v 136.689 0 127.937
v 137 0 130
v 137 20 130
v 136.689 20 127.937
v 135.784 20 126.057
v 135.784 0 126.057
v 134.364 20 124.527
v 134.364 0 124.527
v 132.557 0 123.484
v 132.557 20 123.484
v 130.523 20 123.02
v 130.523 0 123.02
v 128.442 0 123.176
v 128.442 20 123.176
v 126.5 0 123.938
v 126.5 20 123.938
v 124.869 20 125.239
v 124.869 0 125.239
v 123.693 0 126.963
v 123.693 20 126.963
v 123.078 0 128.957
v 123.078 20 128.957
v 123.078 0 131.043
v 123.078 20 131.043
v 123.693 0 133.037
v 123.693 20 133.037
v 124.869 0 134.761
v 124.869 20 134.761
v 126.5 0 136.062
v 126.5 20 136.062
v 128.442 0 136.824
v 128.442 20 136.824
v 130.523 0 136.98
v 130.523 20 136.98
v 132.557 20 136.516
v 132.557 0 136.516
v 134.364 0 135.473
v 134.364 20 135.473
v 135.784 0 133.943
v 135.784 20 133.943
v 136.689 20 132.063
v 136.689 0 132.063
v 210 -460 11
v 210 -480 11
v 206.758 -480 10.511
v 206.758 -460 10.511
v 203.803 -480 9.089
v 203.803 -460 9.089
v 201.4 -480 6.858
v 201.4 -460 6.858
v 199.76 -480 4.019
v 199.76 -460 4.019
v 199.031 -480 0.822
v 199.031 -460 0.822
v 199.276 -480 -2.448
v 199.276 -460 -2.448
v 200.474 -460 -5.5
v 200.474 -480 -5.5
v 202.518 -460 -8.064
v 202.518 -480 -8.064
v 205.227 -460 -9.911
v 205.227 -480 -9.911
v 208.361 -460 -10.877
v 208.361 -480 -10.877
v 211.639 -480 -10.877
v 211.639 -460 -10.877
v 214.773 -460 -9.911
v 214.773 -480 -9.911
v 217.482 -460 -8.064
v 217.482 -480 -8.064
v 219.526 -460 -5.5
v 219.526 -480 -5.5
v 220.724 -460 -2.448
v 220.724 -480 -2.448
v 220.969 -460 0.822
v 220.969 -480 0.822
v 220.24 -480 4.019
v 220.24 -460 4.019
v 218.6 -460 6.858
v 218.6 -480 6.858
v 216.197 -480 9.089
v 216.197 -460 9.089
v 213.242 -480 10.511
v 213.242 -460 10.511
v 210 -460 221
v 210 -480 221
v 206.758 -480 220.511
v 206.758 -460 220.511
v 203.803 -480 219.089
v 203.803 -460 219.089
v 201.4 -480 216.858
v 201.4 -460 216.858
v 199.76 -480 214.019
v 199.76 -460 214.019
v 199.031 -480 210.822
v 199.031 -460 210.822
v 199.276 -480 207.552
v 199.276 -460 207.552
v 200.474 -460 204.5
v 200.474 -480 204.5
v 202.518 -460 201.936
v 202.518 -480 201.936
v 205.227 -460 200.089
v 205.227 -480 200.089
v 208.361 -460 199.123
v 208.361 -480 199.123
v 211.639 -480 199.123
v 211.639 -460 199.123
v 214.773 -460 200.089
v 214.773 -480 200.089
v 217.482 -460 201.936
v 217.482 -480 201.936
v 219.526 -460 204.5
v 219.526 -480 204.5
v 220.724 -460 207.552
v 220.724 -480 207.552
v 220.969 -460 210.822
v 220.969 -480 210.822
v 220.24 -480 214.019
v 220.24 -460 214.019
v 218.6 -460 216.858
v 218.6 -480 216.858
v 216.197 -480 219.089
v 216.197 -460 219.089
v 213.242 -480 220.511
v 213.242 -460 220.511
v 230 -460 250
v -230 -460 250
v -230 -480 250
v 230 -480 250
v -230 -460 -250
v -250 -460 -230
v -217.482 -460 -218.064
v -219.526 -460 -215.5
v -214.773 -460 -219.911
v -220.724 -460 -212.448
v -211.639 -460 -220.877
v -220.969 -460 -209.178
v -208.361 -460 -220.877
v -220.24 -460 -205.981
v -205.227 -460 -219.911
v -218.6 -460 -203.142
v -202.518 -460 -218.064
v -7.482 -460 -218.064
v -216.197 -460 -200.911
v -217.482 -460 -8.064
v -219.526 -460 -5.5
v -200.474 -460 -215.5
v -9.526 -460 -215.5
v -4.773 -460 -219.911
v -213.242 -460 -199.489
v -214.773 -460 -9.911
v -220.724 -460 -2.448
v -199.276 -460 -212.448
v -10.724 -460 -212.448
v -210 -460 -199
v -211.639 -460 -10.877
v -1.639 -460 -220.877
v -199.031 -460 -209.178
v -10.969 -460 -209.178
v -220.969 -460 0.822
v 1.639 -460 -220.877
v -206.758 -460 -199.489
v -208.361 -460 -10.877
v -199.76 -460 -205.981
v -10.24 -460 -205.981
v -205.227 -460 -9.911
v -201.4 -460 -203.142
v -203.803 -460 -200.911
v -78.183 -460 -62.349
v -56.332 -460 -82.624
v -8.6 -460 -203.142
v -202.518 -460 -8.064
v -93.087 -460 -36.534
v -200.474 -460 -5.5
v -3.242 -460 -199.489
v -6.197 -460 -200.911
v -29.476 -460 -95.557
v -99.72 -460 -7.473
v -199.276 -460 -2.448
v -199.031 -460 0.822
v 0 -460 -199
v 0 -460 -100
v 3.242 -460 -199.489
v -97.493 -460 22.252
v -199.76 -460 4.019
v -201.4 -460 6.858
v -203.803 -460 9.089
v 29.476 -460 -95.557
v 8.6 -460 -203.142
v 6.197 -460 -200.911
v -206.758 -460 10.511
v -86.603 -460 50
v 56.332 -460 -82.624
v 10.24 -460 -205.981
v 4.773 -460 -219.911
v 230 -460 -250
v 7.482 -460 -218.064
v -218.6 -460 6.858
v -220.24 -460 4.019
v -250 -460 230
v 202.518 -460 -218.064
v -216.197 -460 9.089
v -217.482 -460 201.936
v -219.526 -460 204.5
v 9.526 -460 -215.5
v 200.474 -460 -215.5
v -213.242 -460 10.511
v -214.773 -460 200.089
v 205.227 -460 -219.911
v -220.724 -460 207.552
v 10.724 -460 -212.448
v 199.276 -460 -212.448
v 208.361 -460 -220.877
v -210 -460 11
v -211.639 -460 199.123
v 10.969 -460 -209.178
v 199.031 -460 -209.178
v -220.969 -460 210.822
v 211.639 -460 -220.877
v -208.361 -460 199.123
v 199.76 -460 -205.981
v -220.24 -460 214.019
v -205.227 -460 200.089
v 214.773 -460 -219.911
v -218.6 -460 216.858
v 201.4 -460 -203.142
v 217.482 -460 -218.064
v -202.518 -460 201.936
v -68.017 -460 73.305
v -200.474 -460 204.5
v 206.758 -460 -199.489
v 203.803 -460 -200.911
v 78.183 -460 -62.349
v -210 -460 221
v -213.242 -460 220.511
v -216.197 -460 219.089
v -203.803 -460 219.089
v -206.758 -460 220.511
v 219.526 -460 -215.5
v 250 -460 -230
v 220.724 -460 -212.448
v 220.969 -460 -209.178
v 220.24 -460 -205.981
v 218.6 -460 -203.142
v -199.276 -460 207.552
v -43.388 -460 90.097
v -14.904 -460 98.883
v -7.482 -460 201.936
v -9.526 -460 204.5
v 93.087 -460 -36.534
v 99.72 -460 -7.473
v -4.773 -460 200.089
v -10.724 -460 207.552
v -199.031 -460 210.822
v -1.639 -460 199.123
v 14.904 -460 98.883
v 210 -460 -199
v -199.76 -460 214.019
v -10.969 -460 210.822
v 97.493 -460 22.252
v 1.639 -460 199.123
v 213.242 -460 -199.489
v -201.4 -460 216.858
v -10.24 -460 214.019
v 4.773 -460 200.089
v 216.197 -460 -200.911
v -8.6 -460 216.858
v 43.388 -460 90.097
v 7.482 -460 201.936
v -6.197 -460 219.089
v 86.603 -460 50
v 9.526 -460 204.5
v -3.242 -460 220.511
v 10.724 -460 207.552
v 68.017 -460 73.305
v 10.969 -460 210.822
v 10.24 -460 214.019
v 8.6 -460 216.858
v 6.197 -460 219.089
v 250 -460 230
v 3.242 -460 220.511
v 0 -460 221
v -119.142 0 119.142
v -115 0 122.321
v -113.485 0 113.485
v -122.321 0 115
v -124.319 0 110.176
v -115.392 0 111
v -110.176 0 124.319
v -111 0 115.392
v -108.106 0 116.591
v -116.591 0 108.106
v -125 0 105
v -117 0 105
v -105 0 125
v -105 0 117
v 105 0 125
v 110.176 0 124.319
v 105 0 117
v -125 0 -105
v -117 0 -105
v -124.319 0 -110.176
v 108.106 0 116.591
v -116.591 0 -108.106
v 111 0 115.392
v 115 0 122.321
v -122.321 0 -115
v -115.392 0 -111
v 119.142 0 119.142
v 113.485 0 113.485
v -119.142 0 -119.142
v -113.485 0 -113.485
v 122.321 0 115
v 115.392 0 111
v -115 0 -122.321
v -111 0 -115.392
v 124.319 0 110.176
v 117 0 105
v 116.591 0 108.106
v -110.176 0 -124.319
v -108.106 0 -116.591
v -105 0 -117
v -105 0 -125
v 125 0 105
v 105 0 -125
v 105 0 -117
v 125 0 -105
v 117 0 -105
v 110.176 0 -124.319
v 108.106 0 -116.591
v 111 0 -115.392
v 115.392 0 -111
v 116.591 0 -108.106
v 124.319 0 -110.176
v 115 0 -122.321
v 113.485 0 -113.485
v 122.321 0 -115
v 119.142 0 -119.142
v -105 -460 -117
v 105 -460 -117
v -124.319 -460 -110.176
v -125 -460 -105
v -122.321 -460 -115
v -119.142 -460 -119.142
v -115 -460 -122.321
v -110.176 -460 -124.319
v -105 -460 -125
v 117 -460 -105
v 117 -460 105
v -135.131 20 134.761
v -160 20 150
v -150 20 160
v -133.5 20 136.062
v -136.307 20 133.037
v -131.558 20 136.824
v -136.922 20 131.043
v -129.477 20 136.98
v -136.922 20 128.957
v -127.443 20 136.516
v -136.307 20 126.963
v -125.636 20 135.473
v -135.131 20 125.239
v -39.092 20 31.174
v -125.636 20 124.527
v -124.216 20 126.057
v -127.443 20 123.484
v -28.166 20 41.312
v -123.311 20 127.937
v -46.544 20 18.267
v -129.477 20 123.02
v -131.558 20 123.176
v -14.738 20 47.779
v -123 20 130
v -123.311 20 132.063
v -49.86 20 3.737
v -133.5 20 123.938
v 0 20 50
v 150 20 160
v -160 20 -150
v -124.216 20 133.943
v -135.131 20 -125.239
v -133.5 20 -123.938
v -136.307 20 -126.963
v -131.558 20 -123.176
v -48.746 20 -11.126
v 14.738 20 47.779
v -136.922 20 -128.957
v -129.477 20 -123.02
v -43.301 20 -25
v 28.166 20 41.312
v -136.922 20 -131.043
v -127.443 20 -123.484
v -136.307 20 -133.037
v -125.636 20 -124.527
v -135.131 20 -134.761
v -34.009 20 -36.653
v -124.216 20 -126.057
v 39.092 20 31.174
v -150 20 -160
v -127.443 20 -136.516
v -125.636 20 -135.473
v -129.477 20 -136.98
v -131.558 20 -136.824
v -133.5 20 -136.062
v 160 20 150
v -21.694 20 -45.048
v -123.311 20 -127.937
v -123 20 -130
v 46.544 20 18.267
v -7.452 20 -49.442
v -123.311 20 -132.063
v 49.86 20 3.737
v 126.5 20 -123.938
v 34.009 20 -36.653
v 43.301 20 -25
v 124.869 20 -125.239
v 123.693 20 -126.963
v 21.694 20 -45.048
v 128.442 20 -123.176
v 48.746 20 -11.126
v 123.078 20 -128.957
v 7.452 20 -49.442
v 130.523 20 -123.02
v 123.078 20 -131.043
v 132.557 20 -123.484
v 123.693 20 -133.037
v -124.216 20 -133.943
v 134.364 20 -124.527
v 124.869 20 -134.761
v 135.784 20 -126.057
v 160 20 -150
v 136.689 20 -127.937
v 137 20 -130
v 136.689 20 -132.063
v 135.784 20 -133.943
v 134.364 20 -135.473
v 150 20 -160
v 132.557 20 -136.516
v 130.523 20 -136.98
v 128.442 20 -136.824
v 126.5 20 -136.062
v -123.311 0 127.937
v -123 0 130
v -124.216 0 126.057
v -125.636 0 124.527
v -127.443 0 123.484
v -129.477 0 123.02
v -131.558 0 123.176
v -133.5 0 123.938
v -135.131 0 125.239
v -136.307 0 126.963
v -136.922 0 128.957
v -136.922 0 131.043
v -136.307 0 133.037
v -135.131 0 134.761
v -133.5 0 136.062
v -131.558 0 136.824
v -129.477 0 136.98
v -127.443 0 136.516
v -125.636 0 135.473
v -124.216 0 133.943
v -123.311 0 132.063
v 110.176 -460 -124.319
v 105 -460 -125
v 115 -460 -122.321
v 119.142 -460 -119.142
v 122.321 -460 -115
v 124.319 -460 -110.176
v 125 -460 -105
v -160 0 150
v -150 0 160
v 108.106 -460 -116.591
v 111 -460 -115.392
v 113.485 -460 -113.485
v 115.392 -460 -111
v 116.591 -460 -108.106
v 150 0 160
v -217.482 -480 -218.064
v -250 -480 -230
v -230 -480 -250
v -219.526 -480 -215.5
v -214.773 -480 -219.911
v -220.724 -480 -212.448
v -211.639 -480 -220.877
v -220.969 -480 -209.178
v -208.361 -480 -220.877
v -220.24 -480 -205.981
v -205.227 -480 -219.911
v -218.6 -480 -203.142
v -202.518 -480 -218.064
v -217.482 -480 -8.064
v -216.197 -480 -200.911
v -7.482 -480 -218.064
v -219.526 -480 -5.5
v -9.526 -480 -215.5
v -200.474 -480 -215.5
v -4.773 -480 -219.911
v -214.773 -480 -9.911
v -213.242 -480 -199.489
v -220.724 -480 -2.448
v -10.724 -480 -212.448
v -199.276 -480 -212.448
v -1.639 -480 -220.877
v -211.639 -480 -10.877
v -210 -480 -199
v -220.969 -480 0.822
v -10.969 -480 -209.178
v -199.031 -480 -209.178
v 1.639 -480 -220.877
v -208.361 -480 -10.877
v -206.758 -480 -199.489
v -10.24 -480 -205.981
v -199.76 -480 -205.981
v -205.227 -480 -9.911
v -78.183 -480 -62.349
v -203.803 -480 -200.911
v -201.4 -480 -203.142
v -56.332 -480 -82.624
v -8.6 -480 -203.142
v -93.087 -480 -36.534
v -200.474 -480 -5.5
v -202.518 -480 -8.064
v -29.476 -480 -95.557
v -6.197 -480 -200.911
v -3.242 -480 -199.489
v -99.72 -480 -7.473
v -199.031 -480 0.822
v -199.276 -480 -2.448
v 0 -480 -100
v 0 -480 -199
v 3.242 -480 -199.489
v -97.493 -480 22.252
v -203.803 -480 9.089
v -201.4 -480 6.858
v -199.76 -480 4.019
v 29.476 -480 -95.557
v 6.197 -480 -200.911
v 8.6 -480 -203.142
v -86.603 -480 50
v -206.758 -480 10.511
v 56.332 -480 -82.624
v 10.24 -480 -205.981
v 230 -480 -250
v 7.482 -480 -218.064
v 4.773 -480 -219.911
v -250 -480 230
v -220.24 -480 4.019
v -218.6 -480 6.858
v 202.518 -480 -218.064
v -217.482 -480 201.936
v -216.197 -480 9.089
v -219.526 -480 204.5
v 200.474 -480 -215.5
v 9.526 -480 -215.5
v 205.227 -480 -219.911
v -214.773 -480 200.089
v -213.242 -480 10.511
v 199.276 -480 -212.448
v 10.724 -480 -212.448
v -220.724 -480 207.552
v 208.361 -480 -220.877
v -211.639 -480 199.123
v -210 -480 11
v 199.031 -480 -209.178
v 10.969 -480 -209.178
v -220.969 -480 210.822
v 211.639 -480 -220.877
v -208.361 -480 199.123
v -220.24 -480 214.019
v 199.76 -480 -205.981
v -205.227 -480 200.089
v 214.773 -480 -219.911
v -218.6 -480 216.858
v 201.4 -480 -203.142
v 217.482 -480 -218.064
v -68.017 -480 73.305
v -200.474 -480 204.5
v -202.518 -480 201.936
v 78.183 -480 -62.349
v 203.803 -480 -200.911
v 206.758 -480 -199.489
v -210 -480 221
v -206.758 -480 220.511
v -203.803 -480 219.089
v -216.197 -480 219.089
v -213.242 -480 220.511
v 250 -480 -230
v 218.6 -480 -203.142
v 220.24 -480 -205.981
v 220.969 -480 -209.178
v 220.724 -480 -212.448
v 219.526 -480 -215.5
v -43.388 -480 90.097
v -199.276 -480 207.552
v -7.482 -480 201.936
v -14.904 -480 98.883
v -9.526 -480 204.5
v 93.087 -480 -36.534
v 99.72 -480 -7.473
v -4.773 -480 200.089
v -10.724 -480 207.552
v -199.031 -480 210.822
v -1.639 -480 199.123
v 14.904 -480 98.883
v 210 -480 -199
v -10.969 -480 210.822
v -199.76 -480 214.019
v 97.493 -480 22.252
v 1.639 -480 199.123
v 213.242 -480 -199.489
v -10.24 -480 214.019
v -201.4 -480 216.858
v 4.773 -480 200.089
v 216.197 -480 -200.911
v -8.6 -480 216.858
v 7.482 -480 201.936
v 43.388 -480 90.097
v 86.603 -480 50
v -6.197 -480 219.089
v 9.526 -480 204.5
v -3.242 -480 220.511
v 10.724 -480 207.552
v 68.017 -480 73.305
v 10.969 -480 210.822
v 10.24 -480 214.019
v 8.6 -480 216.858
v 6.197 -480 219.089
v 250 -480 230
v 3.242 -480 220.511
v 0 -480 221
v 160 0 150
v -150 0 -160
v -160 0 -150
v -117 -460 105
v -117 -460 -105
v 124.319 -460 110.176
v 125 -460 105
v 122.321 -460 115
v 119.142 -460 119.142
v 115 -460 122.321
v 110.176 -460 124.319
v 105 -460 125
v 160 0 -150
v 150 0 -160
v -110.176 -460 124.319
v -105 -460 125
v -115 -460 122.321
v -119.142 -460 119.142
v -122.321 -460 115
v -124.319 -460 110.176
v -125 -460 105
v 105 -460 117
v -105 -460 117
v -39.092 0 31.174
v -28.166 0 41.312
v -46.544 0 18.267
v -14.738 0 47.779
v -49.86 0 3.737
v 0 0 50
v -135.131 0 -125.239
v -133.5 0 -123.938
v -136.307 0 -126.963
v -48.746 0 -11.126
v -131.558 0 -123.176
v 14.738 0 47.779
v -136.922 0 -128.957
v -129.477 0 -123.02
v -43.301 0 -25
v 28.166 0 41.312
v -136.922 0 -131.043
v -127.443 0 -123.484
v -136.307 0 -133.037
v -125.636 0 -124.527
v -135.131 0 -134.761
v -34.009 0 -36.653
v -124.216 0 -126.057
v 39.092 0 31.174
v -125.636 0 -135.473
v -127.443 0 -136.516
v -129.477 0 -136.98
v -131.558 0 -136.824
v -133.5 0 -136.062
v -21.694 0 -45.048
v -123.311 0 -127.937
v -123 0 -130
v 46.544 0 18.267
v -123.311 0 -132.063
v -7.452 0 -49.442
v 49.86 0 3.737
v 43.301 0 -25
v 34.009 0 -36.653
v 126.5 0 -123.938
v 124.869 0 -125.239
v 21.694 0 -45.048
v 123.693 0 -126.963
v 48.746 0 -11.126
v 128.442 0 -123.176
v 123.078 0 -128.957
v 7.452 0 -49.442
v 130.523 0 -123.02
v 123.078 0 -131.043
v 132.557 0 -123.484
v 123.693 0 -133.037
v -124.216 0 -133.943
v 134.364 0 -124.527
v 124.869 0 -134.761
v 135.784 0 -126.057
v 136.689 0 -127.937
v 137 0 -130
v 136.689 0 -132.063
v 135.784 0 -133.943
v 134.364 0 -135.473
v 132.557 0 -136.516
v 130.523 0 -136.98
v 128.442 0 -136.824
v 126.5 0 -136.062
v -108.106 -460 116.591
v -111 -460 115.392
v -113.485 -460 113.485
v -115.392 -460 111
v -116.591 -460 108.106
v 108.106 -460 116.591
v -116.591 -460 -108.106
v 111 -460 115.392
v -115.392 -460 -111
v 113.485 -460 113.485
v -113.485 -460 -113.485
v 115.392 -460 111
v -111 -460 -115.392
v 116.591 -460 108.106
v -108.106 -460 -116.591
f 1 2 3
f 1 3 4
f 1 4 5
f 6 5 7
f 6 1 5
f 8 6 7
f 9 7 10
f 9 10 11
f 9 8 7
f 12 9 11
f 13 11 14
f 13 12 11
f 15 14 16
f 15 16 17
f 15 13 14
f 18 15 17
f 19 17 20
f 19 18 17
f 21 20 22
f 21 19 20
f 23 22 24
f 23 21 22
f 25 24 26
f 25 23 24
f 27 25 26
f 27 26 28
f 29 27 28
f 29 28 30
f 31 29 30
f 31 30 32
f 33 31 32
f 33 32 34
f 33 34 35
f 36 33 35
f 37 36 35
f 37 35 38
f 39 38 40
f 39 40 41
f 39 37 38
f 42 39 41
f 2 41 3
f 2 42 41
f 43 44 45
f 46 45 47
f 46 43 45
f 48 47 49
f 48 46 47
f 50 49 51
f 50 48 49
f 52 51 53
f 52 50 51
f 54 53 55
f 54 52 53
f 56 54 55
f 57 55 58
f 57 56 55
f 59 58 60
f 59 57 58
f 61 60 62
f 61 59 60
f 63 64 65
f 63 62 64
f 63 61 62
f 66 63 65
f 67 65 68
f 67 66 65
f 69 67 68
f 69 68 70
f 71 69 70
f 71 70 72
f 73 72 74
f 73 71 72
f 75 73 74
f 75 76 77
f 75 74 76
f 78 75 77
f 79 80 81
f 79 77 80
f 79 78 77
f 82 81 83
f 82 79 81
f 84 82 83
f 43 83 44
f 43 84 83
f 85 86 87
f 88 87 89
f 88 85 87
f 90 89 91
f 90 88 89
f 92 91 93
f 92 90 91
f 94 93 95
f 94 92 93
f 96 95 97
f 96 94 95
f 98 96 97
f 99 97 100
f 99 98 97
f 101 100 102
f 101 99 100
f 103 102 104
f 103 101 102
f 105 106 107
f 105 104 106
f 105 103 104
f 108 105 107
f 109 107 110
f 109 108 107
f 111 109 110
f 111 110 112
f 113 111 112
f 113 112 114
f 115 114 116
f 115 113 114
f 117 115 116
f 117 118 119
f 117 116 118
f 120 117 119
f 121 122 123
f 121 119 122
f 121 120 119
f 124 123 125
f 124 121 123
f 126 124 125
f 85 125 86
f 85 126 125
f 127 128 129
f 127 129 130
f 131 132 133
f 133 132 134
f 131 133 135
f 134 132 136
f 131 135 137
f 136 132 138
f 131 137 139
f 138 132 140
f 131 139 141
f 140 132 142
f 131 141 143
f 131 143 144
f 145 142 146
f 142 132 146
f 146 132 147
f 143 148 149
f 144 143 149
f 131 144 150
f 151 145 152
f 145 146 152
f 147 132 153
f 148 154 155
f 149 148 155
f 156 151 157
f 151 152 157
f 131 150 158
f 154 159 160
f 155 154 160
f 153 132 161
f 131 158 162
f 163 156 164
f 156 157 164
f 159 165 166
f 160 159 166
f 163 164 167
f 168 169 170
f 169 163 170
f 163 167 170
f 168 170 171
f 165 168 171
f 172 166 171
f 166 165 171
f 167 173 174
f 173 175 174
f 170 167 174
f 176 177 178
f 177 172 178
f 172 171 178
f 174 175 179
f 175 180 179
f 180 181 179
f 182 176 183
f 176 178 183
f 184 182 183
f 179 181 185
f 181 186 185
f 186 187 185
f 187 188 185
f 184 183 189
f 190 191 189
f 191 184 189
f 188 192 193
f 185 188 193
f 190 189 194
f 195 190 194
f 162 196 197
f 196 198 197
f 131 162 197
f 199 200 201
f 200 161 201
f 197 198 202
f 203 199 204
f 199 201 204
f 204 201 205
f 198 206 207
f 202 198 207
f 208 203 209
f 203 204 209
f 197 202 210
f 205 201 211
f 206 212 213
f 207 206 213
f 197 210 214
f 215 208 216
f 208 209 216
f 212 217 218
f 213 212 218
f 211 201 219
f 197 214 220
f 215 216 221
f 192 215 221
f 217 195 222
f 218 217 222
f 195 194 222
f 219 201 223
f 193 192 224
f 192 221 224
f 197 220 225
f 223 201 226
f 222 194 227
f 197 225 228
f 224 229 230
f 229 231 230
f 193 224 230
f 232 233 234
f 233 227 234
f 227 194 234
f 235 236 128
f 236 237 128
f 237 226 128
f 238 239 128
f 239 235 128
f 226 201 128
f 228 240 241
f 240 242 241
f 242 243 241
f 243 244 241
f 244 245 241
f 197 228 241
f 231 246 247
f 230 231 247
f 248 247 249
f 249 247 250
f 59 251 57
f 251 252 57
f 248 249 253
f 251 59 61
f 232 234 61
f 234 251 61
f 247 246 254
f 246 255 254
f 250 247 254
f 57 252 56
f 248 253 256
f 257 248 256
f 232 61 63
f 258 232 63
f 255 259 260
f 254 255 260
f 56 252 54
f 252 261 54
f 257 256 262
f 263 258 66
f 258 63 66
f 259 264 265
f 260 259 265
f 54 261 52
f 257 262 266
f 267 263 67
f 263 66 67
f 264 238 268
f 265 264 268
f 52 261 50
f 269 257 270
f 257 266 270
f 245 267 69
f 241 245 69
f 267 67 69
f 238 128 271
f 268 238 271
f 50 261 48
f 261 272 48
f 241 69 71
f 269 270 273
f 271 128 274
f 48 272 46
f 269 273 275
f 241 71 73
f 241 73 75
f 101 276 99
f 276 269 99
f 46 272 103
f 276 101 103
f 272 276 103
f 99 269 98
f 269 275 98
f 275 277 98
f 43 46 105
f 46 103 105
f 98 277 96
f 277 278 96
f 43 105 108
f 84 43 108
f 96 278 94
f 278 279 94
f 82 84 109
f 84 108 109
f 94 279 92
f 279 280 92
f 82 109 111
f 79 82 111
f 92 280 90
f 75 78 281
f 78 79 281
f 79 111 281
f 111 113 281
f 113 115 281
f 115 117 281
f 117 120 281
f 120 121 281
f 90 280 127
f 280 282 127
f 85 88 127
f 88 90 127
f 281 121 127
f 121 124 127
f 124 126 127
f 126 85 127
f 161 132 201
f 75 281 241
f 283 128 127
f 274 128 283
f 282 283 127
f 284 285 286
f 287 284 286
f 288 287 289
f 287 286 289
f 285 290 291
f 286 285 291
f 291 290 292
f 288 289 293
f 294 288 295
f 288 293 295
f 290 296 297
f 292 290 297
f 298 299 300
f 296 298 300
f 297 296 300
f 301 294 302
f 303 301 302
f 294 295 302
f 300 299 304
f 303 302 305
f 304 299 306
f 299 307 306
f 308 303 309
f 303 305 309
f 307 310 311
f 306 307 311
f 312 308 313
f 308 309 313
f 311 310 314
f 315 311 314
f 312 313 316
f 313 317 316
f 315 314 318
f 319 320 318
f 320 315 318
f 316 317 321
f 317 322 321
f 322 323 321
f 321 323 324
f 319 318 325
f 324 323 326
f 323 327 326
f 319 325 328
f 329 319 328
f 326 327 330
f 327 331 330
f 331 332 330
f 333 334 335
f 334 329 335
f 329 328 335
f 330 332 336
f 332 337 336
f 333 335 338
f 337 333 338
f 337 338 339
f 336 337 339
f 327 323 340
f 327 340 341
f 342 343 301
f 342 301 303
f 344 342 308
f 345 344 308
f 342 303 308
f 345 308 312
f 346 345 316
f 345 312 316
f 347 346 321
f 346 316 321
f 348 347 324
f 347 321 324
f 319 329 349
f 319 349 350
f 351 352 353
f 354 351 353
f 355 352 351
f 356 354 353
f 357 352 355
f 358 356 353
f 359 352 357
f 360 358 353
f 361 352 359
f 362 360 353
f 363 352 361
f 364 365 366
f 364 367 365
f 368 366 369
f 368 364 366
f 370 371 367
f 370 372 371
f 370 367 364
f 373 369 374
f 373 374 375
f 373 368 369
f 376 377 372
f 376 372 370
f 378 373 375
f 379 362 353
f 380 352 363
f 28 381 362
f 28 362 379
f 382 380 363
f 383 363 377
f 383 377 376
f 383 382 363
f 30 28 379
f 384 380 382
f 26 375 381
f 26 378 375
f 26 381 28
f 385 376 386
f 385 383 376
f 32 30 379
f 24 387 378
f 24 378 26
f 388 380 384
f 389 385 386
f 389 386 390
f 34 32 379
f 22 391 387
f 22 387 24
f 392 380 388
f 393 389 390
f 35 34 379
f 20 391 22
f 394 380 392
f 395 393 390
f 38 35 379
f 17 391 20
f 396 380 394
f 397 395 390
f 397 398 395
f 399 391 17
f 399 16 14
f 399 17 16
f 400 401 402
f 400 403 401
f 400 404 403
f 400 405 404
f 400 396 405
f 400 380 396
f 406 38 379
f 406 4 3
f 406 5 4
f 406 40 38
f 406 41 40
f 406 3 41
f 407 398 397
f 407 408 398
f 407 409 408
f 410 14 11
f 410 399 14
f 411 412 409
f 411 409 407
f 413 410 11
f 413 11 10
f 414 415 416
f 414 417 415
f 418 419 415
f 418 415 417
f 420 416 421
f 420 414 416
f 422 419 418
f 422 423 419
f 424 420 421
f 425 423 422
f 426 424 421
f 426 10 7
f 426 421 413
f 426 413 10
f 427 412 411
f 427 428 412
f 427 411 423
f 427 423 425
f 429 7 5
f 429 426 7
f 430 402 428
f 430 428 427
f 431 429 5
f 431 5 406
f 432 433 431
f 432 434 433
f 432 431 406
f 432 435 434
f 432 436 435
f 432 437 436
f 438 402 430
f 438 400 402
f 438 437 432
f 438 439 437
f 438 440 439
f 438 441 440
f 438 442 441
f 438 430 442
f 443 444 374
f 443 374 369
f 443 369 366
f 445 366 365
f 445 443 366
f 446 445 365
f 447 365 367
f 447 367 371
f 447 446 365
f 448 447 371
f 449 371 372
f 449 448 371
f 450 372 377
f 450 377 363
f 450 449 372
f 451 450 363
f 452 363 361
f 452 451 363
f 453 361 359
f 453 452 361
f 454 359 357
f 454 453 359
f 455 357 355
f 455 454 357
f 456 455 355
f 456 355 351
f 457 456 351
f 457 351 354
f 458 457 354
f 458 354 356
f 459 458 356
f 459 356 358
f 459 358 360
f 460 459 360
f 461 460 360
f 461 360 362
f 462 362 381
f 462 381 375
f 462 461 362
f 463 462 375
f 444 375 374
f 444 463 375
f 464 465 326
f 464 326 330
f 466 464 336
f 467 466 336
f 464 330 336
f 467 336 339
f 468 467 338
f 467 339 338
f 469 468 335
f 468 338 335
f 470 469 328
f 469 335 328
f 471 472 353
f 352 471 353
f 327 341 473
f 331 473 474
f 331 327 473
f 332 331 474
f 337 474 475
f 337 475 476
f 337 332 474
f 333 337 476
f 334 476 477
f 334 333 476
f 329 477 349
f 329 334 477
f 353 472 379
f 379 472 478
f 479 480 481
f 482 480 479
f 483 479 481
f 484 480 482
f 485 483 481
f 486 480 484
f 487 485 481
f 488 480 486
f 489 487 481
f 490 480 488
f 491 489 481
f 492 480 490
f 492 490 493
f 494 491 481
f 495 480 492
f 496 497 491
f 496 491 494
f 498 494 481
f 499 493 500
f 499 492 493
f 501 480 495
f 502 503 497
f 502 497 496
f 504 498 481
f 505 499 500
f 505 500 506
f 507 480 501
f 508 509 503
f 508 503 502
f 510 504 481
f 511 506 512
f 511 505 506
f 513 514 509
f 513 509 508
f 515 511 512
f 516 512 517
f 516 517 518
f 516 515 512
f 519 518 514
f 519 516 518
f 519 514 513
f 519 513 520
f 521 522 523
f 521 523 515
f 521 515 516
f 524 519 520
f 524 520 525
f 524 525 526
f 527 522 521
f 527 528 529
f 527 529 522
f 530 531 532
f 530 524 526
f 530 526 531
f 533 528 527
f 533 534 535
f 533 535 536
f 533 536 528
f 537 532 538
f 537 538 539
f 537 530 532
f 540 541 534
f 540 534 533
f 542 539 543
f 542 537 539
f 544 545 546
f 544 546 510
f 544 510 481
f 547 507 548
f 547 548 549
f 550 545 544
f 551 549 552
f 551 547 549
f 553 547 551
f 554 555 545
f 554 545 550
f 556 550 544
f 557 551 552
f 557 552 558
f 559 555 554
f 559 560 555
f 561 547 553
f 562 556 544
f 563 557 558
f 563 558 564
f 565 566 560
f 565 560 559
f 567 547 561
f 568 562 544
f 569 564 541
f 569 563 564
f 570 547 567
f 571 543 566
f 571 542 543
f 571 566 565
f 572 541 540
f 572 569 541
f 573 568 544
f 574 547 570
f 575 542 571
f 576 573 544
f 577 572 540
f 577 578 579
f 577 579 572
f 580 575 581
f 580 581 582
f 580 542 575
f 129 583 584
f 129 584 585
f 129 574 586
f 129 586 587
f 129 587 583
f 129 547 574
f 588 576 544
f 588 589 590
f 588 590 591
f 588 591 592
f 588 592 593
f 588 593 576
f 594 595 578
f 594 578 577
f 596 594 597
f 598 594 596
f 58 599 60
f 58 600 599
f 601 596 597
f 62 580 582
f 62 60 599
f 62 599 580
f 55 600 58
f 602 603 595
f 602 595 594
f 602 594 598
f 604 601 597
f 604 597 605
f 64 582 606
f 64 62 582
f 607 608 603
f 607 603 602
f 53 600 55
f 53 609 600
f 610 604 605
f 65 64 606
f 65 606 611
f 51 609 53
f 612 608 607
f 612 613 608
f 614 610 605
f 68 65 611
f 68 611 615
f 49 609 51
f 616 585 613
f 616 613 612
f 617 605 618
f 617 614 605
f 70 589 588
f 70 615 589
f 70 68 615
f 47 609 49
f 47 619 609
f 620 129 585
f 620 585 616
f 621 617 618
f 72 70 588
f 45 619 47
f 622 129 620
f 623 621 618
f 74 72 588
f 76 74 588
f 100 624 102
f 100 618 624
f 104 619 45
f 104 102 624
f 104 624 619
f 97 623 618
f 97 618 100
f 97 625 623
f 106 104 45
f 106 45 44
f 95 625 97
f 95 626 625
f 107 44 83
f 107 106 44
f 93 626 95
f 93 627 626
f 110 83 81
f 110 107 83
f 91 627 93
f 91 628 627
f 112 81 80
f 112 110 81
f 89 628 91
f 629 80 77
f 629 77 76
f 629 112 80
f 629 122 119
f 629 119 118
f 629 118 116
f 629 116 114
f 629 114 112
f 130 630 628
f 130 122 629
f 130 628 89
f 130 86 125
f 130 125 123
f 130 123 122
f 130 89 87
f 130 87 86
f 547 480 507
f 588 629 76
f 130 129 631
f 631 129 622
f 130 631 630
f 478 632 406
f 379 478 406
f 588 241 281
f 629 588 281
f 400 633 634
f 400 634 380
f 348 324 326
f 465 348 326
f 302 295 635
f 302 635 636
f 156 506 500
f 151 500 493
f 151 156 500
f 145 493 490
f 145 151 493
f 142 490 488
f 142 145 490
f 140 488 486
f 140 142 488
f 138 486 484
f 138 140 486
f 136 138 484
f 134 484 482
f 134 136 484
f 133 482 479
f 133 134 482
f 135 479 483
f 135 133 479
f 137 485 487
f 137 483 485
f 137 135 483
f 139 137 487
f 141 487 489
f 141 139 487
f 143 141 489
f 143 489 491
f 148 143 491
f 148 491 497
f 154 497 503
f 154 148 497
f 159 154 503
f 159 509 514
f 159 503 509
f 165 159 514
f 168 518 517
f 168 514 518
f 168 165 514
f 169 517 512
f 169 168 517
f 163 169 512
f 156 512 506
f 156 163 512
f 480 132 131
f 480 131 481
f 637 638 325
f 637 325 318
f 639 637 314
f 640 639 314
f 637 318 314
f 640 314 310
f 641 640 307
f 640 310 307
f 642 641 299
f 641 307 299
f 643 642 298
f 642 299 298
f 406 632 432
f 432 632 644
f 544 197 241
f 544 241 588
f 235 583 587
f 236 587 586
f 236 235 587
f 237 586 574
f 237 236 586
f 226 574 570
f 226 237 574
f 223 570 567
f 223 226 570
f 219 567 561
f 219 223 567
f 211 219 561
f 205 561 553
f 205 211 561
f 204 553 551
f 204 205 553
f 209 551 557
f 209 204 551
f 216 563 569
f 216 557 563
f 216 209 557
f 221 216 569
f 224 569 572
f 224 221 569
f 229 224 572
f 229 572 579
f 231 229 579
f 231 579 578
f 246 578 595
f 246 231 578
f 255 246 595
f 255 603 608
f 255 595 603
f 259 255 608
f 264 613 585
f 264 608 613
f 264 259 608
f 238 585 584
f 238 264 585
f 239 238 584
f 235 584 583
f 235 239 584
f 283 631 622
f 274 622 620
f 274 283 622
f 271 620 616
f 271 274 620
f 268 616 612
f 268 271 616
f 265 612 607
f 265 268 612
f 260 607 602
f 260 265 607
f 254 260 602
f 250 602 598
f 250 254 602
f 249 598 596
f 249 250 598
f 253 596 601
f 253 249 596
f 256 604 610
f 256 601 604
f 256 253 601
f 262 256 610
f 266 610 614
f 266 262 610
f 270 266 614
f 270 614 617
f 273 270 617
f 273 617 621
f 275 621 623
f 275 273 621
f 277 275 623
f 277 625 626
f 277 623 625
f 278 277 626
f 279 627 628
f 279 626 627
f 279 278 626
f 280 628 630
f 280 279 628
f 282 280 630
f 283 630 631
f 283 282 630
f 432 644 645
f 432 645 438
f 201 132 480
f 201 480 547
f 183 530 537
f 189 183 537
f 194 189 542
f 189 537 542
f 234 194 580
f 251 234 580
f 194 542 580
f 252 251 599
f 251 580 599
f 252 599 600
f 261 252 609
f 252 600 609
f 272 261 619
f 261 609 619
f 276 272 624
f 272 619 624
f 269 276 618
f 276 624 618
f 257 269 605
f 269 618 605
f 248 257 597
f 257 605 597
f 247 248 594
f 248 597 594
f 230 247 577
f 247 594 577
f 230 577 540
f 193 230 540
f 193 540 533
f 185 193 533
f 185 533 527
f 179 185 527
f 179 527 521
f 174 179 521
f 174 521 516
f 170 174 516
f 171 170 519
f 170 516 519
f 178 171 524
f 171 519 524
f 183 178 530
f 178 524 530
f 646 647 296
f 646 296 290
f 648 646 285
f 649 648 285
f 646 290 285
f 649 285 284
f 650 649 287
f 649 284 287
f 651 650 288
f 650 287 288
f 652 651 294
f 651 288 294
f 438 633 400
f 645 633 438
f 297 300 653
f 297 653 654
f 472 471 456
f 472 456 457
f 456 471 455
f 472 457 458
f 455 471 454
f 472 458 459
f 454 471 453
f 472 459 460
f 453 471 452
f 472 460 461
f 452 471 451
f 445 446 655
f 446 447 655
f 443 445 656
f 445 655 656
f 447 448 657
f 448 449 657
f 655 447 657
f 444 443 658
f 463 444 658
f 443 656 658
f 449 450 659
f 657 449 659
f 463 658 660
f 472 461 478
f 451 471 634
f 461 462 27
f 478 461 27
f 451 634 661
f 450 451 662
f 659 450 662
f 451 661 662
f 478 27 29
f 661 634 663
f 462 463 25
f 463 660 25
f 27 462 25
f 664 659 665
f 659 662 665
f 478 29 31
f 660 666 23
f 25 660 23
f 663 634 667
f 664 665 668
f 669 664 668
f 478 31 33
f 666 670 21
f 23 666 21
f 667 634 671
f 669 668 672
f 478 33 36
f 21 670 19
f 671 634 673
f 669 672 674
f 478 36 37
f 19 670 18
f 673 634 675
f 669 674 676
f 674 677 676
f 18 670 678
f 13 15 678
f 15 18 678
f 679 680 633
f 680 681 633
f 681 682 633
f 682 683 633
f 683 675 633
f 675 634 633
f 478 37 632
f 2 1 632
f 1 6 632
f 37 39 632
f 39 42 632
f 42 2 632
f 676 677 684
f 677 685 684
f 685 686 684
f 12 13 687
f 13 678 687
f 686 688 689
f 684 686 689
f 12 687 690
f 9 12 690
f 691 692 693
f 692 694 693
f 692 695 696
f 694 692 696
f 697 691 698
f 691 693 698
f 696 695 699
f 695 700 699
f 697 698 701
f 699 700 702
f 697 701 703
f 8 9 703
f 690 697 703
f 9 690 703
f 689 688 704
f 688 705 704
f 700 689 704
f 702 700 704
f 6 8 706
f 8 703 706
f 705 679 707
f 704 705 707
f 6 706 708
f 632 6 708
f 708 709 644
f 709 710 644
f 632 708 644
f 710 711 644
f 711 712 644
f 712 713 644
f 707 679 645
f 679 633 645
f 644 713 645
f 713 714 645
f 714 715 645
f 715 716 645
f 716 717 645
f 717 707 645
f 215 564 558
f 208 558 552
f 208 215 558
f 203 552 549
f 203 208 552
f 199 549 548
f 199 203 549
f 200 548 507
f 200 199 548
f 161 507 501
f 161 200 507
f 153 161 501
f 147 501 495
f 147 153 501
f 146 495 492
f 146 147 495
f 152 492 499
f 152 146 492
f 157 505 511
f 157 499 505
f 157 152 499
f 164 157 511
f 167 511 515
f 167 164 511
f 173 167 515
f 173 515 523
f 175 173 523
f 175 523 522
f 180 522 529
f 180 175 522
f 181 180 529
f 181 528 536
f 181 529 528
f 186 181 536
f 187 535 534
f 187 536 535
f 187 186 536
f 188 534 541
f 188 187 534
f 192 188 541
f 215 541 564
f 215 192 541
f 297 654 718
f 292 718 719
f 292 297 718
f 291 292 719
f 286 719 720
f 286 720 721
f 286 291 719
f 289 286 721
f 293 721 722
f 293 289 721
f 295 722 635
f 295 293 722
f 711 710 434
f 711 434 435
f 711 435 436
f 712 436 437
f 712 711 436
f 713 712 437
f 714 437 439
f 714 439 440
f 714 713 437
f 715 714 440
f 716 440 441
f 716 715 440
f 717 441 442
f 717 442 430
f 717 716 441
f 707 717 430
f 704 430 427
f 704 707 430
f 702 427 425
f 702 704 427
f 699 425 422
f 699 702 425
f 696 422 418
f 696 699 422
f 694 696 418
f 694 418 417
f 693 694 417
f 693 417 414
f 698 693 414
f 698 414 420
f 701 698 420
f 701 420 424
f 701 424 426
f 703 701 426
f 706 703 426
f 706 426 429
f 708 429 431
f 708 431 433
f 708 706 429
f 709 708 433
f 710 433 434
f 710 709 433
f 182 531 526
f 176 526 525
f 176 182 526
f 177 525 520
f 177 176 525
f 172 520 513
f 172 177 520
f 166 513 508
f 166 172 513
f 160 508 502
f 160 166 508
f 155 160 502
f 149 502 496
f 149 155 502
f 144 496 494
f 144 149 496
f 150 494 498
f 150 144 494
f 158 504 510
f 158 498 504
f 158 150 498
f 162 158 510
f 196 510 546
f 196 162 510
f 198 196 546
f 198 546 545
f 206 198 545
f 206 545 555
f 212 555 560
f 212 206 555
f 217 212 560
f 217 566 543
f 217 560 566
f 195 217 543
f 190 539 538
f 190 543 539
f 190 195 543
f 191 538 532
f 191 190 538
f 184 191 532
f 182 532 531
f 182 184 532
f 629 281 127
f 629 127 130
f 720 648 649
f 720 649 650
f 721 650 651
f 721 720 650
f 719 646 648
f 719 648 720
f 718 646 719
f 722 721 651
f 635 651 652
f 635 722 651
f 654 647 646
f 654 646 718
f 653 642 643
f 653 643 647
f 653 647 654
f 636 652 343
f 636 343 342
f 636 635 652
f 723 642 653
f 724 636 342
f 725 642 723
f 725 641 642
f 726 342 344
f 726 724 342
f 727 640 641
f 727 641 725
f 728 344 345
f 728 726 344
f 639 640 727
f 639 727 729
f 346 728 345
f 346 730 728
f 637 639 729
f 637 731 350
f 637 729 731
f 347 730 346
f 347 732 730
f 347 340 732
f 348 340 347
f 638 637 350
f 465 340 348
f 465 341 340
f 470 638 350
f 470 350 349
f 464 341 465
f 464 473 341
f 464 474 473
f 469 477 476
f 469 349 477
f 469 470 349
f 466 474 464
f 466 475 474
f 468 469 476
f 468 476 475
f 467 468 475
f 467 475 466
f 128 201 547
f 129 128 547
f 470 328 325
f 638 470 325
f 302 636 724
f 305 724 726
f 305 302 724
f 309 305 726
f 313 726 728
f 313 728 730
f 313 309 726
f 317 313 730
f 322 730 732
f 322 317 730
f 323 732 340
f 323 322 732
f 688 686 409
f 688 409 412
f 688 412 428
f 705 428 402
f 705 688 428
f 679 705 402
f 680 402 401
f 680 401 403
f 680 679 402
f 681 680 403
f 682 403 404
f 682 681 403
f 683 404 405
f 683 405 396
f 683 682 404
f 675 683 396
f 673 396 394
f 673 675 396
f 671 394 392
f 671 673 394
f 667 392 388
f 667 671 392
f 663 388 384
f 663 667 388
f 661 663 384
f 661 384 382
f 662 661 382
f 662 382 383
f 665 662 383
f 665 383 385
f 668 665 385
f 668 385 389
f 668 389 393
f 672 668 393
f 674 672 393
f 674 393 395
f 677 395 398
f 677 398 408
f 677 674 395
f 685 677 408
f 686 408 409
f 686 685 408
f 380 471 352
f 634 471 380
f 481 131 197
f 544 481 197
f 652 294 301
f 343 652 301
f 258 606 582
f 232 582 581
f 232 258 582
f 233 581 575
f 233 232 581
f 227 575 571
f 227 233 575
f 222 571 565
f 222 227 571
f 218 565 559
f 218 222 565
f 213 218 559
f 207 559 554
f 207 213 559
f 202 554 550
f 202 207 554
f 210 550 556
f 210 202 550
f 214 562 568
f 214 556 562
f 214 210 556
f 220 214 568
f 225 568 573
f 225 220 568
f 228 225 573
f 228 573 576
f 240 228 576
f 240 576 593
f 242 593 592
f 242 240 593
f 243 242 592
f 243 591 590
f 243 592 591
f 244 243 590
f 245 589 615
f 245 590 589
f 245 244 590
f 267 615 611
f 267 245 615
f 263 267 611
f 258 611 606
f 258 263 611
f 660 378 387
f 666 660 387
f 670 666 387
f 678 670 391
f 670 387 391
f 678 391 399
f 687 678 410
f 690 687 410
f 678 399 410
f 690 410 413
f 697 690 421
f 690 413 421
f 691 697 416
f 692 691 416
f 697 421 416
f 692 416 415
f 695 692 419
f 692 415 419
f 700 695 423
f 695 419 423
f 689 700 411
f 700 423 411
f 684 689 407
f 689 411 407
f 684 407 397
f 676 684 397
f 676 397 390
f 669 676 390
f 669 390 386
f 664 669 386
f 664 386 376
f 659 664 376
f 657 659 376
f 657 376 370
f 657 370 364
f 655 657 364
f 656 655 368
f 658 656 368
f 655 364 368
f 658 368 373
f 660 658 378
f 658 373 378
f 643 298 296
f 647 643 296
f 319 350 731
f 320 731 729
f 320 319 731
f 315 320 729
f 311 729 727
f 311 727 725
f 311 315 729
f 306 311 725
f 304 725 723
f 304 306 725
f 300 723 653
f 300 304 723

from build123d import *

# Parameters (mm, degrees)
SKETCH_1_W                       = 320
SKETCH_1_H                       = 320
EXTRUDE_1_DEPTH                  = 20
SKETCH_2_R                       = 50
CUT_EXTRUDE_1_DEPTH              = 20
CHAMFER_1_SIZE                   = 10
MEMBER_1_DEPTH                   = 460
SKETCH_15_W                      = 500
SKETCH_15_H                      = 500
EXTRUDE_6_DEPTH                  = 20
CHAMFER_3_SIZE                   = 20
HOLE_WIZARD_22_0_22_2_AT_2_COUNT = 2
HOLE_WIZARD_22_0_22_2_AT_2_PITCH = 420
HOLE_WIZARD_22_0_22_2_AT_3_COUNT = 2
HOLE_WIZARD_22_0_22_2_AT_3_PITCH = 420
HOLE_WIZARD_22_0_22_2_AT_4_COUNT = 2
HOLE_WIZARD_22_0_22_2_AT_4_PITCH = 593.969696197
HOLE_WIZARD_22_0_22_2_AT_5_COUNT = 2
HOLE_WIZARD_22_0_22_2_AT_5_PITCH = 210
HOLE_WIZARD_22_0_22_2_AT_6_COUNT = 2
HOLE_WIZARD_22_0_22_2_AT_6_PITCH = 469.574275275
HOLE_WIZARD_22_0_22_2_AT_7_COUNT = 2
HOLE_WIZARD_22_0_22_2_AT_7_PITCH = 469.574275275
HOLE_WIZARD_22_0_22_2_AT_8_COUNT = 2
HOLE_WIZARD_22_0_22_2_AT_8_PITCH = 210
SKETCH_18_R                      = 100
CUT_EXTRUDE_4_DEPTH              = 20
HOLE_WIZARD_M16_2_OUTLINE_R      = 7
HOLE_WIZARD_M16_2_DEPTH          = 20


# Read off the part's stored shape, not the designer's step: M16 螺纹孔2
with BuildPart() as part:
    # 草图1 → 凸台-拉伸1 (new body)
    with BuildSketch(Plane(origin=(0, 0, 0), x_dir=(1, 0, 0), z_dir=(0, 1, 0))):
        Rectangle(SKETCH_1_W, SKETCH_1_H)
    extrude(amount=EXTRUDE_1_DEPTH)

    # 草图2 → 切除-拉伸1 (cut)
    with BuildSketch(Plane(origin=(0, 20, 0), x_dir=(1, 0, 0), z_dir=(0, 1, 0))):
        with Locations(Location((0, 0, 0), (0, 0, 270))):
            Circle(SKETCH_2_R)
    extrude(amount=-CUT_EXTRUDE_1_DEPTH, mode=Mode.SUBTRACT)

    # 倒角1
    chamfer_1_edges = [part.edges().sort_by_distance(p)[0] for p in [
        (-160, 10, -160),
        (160, 10, -160),
        (160, 10, 160),
        (-160, 10, 160),
    ]]
    chamfer(chamfer_1_edges, length=CHAMFER_1_SIZE)

    # M16 螺纹孔2 outline → M16 螺纹孔2 (cut)
    with BuildSketch(Plane(origin=(0, 0, 0), x_dir=(1, 0, 0), z_dir=(0, 1, 0))):
        with Locations((130, 130)):
            Circle(HOLE_WIZARD_M16_2_OUTLINE_R)
        with Locations((-130, -130)):
            Circle(HOLE_WIZARD_M16_2_OUTLINE_R)
        with Locations((-130, 130)):
            Circle(HOLE_WIZARD_M16_2_OUTLINE_R)
        with Locations((130, -130)):
            Circle(HOLE_WIZARD_M16_2_OUTLINE_R)
    extrude(amount=HOLE_WIZARD_M16_2_DEPTH, mode=Mode.SUBTRACT)


with BuildPart() as body_2:
    # Sketch11 → Member 1 (new body)
    with BuildSketch(Plane(origin=(0, 0, 0), x_dir=(0, 0, -1), z_dir=(0, -1, 0))):
        with BuildLine():
            Line((-105, -125), (105, -125))
            ThreePointArc((105, -125), (119.142135624, -119.142135624), (125, -105))
            Line((125, -105), (125, 105))
            ThreePointArc((125, 105), (119.142135624, 119.142135624), (105, 125))
            Line((105, 125), (-105, 125))
            ThreePointArc((-105, 125), (-119.142135624, 119.142135624), (-125, 105))
            Line((-125, 105), (-125, -105))
            ThreePointArc((-125, -105), (-119.142135624, -119.142135624), (-105, -125))
        make_face()
        with BuildLine():
            Line((-105, -117), (105, -117))
            ThreePointArc((105, -117), (113.485281374, -113.485281374), (117, -105))
            Line((117, -105), (117, 105))
            ThreePointArc((117, 105), (113.485281374, 113.485281374), (105, 117))
            Line((105, 117), (-105, 117))
            ThreePointArc((-105, 117), (-113.485281374, 113.485281374), (-117, 105))
            Line((-117, 105), (-117, -105))
            ThreePointArc((-117, -105), (-113.485281374, -113.485281374), (-105, -117))
        make_face(mode=Mode.SUBTRACT)
    extrude(amount=MEMBER_1_DEPTH)


with BuildPart() as body_3:
    # 草图15 → 凸台-拉伸6 (new body)
    with BuildSketch(Plane.XZ.offset(460)):
        Rectangle(SKETCH_15_W, SKETCH_15_H)
    extrude(amount=EXTRUDE_6_DEPTH)

    # 倒角3
    chamfer_3_edges = [body_3.edges().sort_by_distance(p)[0] for p in [
        (250, -470, -250),
        (-250, -470, -250),
        (-250, -470, 250),
        (250, -470, 250),
    ]]
    chamfer(chamfer_3_edges, length=CHAMFER_3_SIZE)

    # 草图16 → Ø22.0 (22) 直径孔2 (revolve, cut)
    with BuildSketch(Plane(origin=(-210, -460, -210), x_dir=(0, 0, 1), z_dir=(1, 0, 0))):
        Polygon((0, 0), (0, 86.609466809), (11, 80), (11, 0), align=None)
    hole_wizard_22_0_22_2 = revolve(axis=Axis((-210, -453.65, -210), (0, -1, 0)), mode=Mode.SUBTRACT)

    # Ø22.0 (22) 直径孔2 at 2: Ø22.0 (22) 直径孔2 ×2
    with Locations(*[(i * HOLE_WIZARD_22_0_22_2_AT_2_PITCH, 0, 0) for i in range(1, HOLE_WIZARD_22_0_22_2_AT_2_COUNT)]):
        add(hole_wizard_22_0_22_2, mode=Mode.SUBTRACT)

    # Ø22.0 (22) 直径孔2 at 3: Ø22.0 (22) 直径孔2 ×2
    with Locations(*[(0, 0, i * HOLE_WIZARD_22_0_22_2_AT_3_PITCH) for i in range(1, HOLE_WIZARD_22_0_22_2_AT_3_COUNT)]):
        add(hole_wizard_22_0_22_2, mode=Mode.SUBTRACT)

    # Ø22.0 (22) 直径孔2 at 4: Ø22.0 (22) 直径孔2 ×2
    with Locations(*[Vector(0.7071067811865476, 0, 0.7071067811865476) * (i * HOLE_WIZARD_22_0_22_2_AT_4_PITCH) for i in range(1, HOLE_WIZARD_22_0_22_2_AT_4_COUNT)]):
        add(hole_wizard_22_0_22_2, mode=Mode.SUBTRACT)

    # Ø22.0 (22) 直径孔2 at 5: Ø22.0 (22) 直径孔2 ×2
    with Locations(*[(i * HOLE_WIZARD_22_0_22_2_AT_5_PITCH, 0, 0) for i in range(1, HOLE_WIZARD_22_0_22_2_AT_5_COUNT)]):
        add(hole_wizard_22_0_22_2, mode=Mode.SUBTRACT)

    # Ø22.0 (22) 直径孔2 at 6: Ø22.0 (22) 直径孔2 ×2
    with Locations(*[Vector(0.4472135954999578, 0, 0.894427190999916) * (i * HOLE_WIZARD_22_0_22_2_AT_6_PITCH) for i in range(1, HOLE_WIZARD_22_0_22_2_AT_6_COUNT)]):
        add(hole_wizard_22_0_22_2, mode=Mode.SUBTRACT)

    # Ø22.0 (22) 直径孔2 at 7: Ø22.0 (22) 直径孔2 ×2
    with Locations(*[Vector(0.8944271909999159, 0, 0.447213595499958) * (i * HOLE_WIZARD_22_0_22_2_AT_7_PITCH) for i in range(1, HOLE_WIZARD_22_0_22_2_AT_7_COUNT)]):
        add(hole_wizard_22_0_22_2, mode=Mode.SUBTRACT)

    # Ø22.0 (22) 直径孔2 at 8: Ø22.0 (22) 直径孔2 ×2
    with Locations(*[(0, 0, i * HOLE_WIZARD_22_0_22_2_AT_8_PITCH) for i in range(1, HOLE_WIZARD_22_0_22_2_AT_8_COUNT)]):
        add(hole_wizard_22_0_22_2, mode=Mode.SUBTRACT)

    # 草图18 → 切除-拉伸4 (cut)
    with BuildSketch(Plane.XZ.offset(480)):
        with Locations(Location((0, 0, 0), (0, 0, 270))):
            Circle(SKETCH_18_R)
    extrude(amount=-CUT_EXTRUDE_4_DEPTH, mode=Mode.SUBTRACT)


solid = Compound([part.part, body_2.part, body_3.part])
